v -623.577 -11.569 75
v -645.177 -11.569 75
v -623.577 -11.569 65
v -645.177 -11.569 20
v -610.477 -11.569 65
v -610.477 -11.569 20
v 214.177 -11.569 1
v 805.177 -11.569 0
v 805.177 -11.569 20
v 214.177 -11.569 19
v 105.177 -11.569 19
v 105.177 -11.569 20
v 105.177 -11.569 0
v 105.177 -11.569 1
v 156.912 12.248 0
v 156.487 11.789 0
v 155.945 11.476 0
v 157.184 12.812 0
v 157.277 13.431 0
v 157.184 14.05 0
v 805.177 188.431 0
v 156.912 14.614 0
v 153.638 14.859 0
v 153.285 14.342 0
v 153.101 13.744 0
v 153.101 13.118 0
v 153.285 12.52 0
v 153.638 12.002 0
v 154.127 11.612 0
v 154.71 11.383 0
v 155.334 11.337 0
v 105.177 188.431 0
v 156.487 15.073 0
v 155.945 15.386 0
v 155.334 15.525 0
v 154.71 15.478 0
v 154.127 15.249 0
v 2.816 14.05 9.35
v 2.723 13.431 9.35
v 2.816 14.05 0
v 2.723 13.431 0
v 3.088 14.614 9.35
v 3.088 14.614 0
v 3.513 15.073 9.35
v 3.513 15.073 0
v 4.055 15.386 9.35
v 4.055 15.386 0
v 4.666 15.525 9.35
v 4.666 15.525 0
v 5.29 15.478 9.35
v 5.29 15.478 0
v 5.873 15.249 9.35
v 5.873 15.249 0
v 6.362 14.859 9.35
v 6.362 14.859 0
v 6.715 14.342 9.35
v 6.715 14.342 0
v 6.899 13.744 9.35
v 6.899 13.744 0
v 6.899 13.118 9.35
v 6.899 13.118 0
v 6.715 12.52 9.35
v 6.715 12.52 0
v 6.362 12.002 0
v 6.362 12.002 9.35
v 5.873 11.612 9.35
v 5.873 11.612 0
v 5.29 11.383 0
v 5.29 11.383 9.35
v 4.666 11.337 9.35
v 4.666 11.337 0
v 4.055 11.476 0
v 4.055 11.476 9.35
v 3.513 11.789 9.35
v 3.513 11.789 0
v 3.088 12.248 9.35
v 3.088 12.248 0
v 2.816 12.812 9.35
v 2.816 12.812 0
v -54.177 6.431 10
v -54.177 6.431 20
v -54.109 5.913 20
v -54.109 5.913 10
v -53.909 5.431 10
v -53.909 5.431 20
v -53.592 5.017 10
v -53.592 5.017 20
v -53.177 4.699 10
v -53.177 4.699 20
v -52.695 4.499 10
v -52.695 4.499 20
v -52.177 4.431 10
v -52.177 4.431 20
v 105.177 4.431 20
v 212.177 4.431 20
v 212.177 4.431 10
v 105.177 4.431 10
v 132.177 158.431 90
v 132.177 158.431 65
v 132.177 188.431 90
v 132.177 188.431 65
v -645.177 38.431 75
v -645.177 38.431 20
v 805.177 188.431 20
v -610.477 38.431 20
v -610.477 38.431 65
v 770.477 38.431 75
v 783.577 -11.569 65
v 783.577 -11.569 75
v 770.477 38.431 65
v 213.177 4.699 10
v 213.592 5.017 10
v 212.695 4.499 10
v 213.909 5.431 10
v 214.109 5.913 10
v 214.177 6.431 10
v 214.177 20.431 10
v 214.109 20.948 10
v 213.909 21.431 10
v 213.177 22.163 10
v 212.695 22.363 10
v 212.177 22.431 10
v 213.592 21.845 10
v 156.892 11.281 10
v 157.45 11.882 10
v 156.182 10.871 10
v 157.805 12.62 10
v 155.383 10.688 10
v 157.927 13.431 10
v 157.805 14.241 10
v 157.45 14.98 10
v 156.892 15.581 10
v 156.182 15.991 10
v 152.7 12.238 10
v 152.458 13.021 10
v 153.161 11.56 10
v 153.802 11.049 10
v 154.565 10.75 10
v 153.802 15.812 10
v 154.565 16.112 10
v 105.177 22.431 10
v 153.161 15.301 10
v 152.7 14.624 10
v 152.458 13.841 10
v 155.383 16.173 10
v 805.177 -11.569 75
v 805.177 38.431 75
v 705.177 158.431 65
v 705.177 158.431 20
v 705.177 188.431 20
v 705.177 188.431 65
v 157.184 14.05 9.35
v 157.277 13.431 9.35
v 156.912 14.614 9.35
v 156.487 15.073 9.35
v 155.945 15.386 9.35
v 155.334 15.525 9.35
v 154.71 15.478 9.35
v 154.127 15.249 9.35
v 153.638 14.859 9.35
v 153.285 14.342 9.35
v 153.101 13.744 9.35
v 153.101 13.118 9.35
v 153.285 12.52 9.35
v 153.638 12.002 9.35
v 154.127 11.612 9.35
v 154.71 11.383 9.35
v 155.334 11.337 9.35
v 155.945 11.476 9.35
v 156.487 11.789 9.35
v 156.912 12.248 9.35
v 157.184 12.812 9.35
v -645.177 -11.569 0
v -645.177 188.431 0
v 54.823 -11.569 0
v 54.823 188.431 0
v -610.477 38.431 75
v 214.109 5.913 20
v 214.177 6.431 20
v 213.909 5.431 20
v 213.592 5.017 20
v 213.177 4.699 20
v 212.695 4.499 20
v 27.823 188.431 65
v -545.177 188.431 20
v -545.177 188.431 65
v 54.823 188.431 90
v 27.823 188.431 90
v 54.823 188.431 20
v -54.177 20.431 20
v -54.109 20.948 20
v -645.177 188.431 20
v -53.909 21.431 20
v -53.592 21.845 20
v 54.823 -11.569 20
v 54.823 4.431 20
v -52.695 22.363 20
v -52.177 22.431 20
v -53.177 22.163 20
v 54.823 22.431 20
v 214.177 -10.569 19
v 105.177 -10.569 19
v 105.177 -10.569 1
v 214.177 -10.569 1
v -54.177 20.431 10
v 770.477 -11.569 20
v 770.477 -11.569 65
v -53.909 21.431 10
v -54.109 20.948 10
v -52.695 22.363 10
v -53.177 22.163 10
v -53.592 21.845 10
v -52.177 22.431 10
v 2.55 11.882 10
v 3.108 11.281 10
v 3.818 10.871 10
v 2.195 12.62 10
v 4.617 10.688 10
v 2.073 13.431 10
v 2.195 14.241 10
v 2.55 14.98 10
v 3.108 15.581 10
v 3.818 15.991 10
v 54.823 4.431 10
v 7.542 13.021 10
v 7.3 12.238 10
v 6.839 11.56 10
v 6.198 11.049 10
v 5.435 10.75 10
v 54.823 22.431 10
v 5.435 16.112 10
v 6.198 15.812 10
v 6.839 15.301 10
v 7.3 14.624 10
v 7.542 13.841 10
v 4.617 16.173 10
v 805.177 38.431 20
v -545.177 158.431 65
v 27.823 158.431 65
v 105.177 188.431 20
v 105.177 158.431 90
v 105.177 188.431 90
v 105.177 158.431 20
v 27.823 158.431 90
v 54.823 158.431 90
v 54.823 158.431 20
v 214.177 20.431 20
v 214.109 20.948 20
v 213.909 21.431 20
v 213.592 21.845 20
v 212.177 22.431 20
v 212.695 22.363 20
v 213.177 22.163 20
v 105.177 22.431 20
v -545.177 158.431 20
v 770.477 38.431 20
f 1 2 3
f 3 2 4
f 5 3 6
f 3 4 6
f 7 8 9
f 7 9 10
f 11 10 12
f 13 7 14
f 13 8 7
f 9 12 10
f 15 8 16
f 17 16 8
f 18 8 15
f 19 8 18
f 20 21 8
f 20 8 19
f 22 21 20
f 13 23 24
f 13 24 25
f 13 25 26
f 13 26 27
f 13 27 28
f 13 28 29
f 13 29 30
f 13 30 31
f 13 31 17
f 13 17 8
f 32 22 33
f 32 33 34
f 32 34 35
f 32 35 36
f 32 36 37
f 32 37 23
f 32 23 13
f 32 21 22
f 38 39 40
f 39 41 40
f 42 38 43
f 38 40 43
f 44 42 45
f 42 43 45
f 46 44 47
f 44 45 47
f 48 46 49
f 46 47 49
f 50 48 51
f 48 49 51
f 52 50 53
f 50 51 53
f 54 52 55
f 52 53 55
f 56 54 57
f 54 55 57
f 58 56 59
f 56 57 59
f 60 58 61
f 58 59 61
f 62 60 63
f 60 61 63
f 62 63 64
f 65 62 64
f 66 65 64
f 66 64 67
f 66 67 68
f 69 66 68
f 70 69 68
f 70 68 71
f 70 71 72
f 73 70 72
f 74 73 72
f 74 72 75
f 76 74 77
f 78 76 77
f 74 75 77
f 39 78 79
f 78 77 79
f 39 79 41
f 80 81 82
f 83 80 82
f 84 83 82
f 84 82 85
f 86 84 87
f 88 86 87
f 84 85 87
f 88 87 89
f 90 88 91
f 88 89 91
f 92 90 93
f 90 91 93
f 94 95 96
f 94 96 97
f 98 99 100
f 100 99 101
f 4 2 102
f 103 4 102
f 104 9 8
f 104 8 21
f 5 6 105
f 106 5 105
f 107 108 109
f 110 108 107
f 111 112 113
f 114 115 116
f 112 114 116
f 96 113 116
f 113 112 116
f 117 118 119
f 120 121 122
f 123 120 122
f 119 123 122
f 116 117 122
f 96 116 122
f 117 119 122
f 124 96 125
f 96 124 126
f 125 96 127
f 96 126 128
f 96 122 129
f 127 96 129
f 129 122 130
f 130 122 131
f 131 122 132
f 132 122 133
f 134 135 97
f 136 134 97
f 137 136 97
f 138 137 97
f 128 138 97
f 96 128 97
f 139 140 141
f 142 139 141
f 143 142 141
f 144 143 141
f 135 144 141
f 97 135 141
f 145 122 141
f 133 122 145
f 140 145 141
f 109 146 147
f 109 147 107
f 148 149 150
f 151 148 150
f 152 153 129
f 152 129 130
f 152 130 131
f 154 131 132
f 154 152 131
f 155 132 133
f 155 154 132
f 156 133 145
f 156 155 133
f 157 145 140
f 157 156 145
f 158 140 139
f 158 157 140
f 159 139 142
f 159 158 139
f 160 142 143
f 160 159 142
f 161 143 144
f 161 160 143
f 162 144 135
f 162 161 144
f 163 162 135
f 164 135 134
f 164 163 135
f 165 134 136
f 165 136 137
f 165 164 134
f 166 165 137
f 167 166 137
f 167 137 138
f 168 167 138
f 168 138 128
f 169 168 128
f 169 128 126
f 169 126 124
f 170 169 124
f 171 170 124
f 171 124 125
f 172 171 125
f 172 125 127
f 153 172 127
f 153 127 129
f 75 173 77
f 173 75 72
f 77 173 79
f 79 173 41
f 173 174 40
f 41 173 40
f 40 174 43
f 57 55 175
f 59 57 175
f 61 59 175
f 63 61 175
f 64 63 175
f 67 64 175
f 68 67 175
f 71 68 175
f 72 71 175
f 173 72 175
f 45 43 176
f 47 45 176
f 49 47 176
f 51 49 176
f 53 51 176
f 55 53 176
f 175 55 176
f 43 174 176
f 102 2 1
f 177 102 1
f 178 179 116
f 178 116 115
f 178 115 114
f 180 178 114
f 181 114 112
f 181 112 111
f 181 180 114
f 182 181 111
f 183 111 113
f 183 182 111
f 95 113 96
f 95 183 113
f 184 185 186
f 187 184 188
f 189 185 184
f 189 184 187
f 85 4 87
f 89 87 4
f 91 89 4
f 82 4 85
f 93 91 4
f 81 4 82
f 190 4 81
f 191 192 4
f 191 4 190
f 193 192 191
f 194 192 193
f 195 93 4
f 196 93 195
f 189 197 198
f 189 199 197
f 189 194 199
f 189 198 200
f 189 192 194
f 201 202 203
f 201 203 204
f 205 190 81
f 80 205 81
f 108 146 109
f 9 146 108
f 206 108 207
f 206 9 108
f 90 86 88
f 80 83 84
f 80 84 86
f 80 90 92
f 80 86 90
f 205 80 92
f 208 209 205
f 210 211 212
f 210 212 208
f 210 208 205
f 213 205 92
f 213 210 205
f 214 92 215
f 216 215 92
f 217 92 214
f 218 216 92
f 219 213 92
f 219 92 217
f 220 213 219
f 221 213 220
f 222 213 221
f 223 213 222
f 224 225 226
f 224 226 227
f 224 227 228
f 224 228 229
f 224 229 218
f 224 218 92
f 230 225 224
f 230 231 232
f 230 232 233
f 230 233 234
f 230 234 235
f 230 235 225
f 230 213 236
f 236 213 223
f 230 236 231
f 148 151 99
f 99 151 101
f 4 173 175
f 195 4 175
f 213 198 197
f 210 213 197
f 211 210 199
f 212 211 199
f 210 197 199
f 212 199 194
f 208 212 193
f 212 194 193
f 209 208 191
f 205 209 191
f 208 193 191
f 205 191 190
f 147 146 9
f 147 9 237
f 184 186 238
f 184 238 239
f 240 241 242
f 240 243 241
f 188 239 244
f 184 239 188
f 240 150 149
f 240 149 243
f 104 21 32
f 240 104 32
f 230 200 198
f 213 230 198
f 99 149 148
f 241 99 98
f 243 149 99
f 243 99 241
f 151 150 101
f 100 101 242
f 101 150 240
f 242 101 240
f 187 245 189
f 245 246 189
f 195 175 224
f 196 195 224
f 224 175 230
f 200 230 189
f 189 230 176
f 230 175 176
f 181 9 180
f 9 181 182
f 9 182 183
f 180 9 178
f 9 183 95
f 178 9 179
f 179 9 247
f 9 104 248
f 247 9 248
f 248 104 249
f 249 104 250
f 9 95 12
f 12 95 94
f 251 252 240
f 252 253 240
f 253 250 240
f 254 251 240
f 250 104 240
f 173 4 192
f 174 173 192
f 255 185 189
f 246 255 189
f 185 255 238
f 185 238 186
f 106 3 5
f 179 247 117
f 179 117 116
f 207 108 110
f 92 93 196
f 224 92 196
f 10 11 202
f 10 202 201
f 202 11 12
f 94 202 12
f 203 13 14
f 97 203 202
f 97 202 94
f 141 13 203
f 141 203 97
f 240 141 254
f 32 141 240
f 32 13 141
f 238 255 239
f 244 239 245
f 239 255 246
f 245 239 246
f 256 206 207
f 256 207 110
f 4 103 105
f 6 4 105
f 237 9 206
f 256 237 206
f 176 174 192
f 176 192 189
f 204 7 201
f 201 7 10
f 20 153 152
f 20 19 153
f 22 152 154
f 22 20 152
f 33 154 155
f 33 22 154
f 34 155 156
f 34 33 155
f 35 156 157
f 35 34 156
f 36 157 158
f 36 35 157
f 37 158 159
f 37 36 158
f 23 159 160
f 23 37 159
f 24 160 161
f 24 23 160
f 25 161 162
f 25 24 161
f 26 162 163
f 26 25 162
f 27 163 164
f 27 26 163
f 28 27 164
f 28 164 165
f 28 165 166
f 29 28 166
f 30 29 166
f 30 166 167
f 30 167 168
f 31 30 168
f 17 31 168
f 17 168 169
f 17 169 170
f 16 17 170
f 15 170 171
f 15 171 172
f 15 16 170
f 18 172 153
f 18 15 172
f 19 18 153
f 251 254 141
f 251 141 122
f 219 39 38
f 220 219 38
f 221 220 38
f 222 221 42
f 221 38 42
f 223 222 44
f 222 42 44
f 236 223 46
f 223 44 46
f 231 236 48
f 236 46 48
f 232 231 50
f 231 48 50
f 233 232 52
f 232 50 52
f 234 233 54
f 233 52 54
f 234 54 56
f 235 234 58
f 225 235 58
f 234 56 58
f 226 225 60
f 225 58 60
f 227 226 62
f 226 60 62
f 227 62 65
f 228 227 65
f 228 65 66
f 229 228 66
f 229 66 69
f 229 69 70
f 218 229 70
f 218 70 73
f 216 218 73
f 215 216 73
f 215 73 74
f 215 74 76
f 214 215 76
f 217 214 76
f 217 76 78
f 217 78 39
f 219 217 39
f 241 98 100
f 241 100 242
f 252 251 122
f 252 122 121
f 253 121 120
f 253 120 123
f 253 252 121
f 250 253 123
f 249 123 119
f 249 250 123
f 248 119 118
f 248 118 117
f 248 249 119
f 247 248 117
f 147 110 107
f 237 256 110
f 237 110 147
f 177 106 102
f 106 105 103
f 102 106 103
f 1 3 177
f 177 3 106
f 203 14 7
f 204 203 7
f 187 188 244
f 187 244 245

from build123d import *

# Parameters (mm, degrees)
F0_W            = 730
F0_H            = 200
F1_DEPTH        = 20
F2_W            = 600
F2_H            = 30
F3_DEPTH        = 45
F4_W            = 27
F4_H            = 30
F5_DEPTH        = 25
F6_W            = 54.7
F6_H            = 50
F7_DEPTH        = 45
F9_DEPTH        = 10
F11_DEPTH       = 10
F13_D           = 4.2
F13_CSINK_D     = 5.5
F13_CSINK_ANGLE = 90
F14_W           = 20
F14_H           = 50
F15_DEPTH       = 75.001
F18_W           = 109
F18_H           = 18
F19_DEPTH       = 1


with BuildPart() as f1:
    # F0 (on Top) → F1 (new body)
    with BuildSketch(Plane.XY):
        with Locations((-310.177372545, 88.43071796)):
            Rectangle(F0_W, F0_H)
    extrude(amount=F1_DEPTH)

    # F10 (on face) → F11 (cut)
    with BuildSketch(Plane.XY.offset(20)):
        with BuildLine():
            Line((54.822627455, 4.43071796), (54.822627455, 22.43071796))
            Line((54.822627455, 22.43071796), (-52.177372545, 22.43071796))
            ThreePointArc((-52.177372545, 22.43071796), (-53.5915861074, 21.8449315224), (-54.177372545, 20.43071796))
            Line((-54.177372545, 20.43071796), (-54.177372545, 6.43071796))
            ThreePointArc((-54.177372545, 6.43071796), (-53.5915861074, 5.0165043976), (-52.177372545, 4.43071796))
            Line((-52.177372545, 4.43071796), (54.822627455, 4.43071796))
        make_face()
    extrude(amount=-F11_DEPTH, mode=Mode.SUBTRACT)

    # F13 (through all)
    with Locations(Plane.XY.offset(10)):
        with Locations((4.822627455, 13.43071796)):
            CounterSinkHole(F13_D / 2, F13_CSINK_D / 2, counter_sink_angle=F13_CSINK_ANGLE)


with BuildPart() as f3:
    # F2 (on face) → F3 (new body)
    with BuildSketch(Plane.XY.offset(20)):
        with Locations((-245.177372545, 173.43071796)):
            Rectangle(F2_W, F2_H)
    extrude(amount=F3_DEPTH)

    # F4 (on face) → F5 (join)
    with BuildSketch(Plane.XY.offset(65)):
        with Locations((41.322627455, 173.43071796)):
            Rectangle(F4_W, F4_H)
    extrude(amount=F5_DEPTH)


with BuildPart() as f7:
    # F6 (on face) → F7 (new body)
    with BuildSketch(Plane.XY.offset(20)):
        with Locations((-637.827372545, 13.43071796)):
            Rectangle(F6_W, F6_H)
    extrude(amount=F7_DEPTH)

    # F8 (on face) → F9 (join)
    with BuildSketch(Plane.XY.offset(65)):
        Polygon((-610.477372545, 38.43071796), (-665.177372545, 38.43071796), (-665.177372545, -11.56928204), (-623.577372545, -11.56928204), align=None)
    extrude(amount=F9_DEPTH)


with BuildPart() as f15_tool:
    # F14 (on face) → F15 (new body, through all)
    with BuildSketch(Plane.XY.offset(75)):
        Polygon((-645.177372545, 305.616747176), (-700.3073955111, 305.616747176), (-700.3073955111, -131.4291577393), (-645.177372545, -131.4291577393), (-645.177372545, -11.56928204), (-665.177372545, -11.56928204), (-665.177372545, 38.43071796), (-645.177372545, 38.43071796), align=None)
        with Locations((-655.177372545, 13.43071796)):
            Rectangle(F14_W, F14_H)
    extrude(amount=-F15_DEPTH)


with BuildPart() as f1_1:
    add(f1.part)

    # F15: cut by f15_tool
    add(f15_tool.part, mode=Mode.SUBTRACT)


with BuildPart() as f7_1:
    add(f7.part)

    # F15: cut by f15_tool
    add(f15_tool.part, mode=Mode.SUBTRACT)


with BuildPart() as f17_1:
    # F17: instance of F1
    add(f1_1.part.mirror(Plane.YZ.offset(80)))

    # F18 (on face) → F19 (cut)
    with BuildSketch(Plane.XZ.offset(11.56928204)):
        with Locations((159.677372545, 10)):
            Rectangle(F18_W, F18_H)
    extrude(amount=-F19_DEPTH, mode=Mode.SUBTRACT)


with BuildPart() as f17_2:
    # F17: instance of F3
    add(f3.part.mirror(Plane.YZ.offset(80)))


with BuildPart() as f17_3:
    # F17: instance of F7
    add(f7_1.part.mirror(Plane.YZ.offset(80)))


solid = Compound([f3.part, f1_1.part, f7_1.part, f17_1.part, f17_2.part, f17_3.part])
